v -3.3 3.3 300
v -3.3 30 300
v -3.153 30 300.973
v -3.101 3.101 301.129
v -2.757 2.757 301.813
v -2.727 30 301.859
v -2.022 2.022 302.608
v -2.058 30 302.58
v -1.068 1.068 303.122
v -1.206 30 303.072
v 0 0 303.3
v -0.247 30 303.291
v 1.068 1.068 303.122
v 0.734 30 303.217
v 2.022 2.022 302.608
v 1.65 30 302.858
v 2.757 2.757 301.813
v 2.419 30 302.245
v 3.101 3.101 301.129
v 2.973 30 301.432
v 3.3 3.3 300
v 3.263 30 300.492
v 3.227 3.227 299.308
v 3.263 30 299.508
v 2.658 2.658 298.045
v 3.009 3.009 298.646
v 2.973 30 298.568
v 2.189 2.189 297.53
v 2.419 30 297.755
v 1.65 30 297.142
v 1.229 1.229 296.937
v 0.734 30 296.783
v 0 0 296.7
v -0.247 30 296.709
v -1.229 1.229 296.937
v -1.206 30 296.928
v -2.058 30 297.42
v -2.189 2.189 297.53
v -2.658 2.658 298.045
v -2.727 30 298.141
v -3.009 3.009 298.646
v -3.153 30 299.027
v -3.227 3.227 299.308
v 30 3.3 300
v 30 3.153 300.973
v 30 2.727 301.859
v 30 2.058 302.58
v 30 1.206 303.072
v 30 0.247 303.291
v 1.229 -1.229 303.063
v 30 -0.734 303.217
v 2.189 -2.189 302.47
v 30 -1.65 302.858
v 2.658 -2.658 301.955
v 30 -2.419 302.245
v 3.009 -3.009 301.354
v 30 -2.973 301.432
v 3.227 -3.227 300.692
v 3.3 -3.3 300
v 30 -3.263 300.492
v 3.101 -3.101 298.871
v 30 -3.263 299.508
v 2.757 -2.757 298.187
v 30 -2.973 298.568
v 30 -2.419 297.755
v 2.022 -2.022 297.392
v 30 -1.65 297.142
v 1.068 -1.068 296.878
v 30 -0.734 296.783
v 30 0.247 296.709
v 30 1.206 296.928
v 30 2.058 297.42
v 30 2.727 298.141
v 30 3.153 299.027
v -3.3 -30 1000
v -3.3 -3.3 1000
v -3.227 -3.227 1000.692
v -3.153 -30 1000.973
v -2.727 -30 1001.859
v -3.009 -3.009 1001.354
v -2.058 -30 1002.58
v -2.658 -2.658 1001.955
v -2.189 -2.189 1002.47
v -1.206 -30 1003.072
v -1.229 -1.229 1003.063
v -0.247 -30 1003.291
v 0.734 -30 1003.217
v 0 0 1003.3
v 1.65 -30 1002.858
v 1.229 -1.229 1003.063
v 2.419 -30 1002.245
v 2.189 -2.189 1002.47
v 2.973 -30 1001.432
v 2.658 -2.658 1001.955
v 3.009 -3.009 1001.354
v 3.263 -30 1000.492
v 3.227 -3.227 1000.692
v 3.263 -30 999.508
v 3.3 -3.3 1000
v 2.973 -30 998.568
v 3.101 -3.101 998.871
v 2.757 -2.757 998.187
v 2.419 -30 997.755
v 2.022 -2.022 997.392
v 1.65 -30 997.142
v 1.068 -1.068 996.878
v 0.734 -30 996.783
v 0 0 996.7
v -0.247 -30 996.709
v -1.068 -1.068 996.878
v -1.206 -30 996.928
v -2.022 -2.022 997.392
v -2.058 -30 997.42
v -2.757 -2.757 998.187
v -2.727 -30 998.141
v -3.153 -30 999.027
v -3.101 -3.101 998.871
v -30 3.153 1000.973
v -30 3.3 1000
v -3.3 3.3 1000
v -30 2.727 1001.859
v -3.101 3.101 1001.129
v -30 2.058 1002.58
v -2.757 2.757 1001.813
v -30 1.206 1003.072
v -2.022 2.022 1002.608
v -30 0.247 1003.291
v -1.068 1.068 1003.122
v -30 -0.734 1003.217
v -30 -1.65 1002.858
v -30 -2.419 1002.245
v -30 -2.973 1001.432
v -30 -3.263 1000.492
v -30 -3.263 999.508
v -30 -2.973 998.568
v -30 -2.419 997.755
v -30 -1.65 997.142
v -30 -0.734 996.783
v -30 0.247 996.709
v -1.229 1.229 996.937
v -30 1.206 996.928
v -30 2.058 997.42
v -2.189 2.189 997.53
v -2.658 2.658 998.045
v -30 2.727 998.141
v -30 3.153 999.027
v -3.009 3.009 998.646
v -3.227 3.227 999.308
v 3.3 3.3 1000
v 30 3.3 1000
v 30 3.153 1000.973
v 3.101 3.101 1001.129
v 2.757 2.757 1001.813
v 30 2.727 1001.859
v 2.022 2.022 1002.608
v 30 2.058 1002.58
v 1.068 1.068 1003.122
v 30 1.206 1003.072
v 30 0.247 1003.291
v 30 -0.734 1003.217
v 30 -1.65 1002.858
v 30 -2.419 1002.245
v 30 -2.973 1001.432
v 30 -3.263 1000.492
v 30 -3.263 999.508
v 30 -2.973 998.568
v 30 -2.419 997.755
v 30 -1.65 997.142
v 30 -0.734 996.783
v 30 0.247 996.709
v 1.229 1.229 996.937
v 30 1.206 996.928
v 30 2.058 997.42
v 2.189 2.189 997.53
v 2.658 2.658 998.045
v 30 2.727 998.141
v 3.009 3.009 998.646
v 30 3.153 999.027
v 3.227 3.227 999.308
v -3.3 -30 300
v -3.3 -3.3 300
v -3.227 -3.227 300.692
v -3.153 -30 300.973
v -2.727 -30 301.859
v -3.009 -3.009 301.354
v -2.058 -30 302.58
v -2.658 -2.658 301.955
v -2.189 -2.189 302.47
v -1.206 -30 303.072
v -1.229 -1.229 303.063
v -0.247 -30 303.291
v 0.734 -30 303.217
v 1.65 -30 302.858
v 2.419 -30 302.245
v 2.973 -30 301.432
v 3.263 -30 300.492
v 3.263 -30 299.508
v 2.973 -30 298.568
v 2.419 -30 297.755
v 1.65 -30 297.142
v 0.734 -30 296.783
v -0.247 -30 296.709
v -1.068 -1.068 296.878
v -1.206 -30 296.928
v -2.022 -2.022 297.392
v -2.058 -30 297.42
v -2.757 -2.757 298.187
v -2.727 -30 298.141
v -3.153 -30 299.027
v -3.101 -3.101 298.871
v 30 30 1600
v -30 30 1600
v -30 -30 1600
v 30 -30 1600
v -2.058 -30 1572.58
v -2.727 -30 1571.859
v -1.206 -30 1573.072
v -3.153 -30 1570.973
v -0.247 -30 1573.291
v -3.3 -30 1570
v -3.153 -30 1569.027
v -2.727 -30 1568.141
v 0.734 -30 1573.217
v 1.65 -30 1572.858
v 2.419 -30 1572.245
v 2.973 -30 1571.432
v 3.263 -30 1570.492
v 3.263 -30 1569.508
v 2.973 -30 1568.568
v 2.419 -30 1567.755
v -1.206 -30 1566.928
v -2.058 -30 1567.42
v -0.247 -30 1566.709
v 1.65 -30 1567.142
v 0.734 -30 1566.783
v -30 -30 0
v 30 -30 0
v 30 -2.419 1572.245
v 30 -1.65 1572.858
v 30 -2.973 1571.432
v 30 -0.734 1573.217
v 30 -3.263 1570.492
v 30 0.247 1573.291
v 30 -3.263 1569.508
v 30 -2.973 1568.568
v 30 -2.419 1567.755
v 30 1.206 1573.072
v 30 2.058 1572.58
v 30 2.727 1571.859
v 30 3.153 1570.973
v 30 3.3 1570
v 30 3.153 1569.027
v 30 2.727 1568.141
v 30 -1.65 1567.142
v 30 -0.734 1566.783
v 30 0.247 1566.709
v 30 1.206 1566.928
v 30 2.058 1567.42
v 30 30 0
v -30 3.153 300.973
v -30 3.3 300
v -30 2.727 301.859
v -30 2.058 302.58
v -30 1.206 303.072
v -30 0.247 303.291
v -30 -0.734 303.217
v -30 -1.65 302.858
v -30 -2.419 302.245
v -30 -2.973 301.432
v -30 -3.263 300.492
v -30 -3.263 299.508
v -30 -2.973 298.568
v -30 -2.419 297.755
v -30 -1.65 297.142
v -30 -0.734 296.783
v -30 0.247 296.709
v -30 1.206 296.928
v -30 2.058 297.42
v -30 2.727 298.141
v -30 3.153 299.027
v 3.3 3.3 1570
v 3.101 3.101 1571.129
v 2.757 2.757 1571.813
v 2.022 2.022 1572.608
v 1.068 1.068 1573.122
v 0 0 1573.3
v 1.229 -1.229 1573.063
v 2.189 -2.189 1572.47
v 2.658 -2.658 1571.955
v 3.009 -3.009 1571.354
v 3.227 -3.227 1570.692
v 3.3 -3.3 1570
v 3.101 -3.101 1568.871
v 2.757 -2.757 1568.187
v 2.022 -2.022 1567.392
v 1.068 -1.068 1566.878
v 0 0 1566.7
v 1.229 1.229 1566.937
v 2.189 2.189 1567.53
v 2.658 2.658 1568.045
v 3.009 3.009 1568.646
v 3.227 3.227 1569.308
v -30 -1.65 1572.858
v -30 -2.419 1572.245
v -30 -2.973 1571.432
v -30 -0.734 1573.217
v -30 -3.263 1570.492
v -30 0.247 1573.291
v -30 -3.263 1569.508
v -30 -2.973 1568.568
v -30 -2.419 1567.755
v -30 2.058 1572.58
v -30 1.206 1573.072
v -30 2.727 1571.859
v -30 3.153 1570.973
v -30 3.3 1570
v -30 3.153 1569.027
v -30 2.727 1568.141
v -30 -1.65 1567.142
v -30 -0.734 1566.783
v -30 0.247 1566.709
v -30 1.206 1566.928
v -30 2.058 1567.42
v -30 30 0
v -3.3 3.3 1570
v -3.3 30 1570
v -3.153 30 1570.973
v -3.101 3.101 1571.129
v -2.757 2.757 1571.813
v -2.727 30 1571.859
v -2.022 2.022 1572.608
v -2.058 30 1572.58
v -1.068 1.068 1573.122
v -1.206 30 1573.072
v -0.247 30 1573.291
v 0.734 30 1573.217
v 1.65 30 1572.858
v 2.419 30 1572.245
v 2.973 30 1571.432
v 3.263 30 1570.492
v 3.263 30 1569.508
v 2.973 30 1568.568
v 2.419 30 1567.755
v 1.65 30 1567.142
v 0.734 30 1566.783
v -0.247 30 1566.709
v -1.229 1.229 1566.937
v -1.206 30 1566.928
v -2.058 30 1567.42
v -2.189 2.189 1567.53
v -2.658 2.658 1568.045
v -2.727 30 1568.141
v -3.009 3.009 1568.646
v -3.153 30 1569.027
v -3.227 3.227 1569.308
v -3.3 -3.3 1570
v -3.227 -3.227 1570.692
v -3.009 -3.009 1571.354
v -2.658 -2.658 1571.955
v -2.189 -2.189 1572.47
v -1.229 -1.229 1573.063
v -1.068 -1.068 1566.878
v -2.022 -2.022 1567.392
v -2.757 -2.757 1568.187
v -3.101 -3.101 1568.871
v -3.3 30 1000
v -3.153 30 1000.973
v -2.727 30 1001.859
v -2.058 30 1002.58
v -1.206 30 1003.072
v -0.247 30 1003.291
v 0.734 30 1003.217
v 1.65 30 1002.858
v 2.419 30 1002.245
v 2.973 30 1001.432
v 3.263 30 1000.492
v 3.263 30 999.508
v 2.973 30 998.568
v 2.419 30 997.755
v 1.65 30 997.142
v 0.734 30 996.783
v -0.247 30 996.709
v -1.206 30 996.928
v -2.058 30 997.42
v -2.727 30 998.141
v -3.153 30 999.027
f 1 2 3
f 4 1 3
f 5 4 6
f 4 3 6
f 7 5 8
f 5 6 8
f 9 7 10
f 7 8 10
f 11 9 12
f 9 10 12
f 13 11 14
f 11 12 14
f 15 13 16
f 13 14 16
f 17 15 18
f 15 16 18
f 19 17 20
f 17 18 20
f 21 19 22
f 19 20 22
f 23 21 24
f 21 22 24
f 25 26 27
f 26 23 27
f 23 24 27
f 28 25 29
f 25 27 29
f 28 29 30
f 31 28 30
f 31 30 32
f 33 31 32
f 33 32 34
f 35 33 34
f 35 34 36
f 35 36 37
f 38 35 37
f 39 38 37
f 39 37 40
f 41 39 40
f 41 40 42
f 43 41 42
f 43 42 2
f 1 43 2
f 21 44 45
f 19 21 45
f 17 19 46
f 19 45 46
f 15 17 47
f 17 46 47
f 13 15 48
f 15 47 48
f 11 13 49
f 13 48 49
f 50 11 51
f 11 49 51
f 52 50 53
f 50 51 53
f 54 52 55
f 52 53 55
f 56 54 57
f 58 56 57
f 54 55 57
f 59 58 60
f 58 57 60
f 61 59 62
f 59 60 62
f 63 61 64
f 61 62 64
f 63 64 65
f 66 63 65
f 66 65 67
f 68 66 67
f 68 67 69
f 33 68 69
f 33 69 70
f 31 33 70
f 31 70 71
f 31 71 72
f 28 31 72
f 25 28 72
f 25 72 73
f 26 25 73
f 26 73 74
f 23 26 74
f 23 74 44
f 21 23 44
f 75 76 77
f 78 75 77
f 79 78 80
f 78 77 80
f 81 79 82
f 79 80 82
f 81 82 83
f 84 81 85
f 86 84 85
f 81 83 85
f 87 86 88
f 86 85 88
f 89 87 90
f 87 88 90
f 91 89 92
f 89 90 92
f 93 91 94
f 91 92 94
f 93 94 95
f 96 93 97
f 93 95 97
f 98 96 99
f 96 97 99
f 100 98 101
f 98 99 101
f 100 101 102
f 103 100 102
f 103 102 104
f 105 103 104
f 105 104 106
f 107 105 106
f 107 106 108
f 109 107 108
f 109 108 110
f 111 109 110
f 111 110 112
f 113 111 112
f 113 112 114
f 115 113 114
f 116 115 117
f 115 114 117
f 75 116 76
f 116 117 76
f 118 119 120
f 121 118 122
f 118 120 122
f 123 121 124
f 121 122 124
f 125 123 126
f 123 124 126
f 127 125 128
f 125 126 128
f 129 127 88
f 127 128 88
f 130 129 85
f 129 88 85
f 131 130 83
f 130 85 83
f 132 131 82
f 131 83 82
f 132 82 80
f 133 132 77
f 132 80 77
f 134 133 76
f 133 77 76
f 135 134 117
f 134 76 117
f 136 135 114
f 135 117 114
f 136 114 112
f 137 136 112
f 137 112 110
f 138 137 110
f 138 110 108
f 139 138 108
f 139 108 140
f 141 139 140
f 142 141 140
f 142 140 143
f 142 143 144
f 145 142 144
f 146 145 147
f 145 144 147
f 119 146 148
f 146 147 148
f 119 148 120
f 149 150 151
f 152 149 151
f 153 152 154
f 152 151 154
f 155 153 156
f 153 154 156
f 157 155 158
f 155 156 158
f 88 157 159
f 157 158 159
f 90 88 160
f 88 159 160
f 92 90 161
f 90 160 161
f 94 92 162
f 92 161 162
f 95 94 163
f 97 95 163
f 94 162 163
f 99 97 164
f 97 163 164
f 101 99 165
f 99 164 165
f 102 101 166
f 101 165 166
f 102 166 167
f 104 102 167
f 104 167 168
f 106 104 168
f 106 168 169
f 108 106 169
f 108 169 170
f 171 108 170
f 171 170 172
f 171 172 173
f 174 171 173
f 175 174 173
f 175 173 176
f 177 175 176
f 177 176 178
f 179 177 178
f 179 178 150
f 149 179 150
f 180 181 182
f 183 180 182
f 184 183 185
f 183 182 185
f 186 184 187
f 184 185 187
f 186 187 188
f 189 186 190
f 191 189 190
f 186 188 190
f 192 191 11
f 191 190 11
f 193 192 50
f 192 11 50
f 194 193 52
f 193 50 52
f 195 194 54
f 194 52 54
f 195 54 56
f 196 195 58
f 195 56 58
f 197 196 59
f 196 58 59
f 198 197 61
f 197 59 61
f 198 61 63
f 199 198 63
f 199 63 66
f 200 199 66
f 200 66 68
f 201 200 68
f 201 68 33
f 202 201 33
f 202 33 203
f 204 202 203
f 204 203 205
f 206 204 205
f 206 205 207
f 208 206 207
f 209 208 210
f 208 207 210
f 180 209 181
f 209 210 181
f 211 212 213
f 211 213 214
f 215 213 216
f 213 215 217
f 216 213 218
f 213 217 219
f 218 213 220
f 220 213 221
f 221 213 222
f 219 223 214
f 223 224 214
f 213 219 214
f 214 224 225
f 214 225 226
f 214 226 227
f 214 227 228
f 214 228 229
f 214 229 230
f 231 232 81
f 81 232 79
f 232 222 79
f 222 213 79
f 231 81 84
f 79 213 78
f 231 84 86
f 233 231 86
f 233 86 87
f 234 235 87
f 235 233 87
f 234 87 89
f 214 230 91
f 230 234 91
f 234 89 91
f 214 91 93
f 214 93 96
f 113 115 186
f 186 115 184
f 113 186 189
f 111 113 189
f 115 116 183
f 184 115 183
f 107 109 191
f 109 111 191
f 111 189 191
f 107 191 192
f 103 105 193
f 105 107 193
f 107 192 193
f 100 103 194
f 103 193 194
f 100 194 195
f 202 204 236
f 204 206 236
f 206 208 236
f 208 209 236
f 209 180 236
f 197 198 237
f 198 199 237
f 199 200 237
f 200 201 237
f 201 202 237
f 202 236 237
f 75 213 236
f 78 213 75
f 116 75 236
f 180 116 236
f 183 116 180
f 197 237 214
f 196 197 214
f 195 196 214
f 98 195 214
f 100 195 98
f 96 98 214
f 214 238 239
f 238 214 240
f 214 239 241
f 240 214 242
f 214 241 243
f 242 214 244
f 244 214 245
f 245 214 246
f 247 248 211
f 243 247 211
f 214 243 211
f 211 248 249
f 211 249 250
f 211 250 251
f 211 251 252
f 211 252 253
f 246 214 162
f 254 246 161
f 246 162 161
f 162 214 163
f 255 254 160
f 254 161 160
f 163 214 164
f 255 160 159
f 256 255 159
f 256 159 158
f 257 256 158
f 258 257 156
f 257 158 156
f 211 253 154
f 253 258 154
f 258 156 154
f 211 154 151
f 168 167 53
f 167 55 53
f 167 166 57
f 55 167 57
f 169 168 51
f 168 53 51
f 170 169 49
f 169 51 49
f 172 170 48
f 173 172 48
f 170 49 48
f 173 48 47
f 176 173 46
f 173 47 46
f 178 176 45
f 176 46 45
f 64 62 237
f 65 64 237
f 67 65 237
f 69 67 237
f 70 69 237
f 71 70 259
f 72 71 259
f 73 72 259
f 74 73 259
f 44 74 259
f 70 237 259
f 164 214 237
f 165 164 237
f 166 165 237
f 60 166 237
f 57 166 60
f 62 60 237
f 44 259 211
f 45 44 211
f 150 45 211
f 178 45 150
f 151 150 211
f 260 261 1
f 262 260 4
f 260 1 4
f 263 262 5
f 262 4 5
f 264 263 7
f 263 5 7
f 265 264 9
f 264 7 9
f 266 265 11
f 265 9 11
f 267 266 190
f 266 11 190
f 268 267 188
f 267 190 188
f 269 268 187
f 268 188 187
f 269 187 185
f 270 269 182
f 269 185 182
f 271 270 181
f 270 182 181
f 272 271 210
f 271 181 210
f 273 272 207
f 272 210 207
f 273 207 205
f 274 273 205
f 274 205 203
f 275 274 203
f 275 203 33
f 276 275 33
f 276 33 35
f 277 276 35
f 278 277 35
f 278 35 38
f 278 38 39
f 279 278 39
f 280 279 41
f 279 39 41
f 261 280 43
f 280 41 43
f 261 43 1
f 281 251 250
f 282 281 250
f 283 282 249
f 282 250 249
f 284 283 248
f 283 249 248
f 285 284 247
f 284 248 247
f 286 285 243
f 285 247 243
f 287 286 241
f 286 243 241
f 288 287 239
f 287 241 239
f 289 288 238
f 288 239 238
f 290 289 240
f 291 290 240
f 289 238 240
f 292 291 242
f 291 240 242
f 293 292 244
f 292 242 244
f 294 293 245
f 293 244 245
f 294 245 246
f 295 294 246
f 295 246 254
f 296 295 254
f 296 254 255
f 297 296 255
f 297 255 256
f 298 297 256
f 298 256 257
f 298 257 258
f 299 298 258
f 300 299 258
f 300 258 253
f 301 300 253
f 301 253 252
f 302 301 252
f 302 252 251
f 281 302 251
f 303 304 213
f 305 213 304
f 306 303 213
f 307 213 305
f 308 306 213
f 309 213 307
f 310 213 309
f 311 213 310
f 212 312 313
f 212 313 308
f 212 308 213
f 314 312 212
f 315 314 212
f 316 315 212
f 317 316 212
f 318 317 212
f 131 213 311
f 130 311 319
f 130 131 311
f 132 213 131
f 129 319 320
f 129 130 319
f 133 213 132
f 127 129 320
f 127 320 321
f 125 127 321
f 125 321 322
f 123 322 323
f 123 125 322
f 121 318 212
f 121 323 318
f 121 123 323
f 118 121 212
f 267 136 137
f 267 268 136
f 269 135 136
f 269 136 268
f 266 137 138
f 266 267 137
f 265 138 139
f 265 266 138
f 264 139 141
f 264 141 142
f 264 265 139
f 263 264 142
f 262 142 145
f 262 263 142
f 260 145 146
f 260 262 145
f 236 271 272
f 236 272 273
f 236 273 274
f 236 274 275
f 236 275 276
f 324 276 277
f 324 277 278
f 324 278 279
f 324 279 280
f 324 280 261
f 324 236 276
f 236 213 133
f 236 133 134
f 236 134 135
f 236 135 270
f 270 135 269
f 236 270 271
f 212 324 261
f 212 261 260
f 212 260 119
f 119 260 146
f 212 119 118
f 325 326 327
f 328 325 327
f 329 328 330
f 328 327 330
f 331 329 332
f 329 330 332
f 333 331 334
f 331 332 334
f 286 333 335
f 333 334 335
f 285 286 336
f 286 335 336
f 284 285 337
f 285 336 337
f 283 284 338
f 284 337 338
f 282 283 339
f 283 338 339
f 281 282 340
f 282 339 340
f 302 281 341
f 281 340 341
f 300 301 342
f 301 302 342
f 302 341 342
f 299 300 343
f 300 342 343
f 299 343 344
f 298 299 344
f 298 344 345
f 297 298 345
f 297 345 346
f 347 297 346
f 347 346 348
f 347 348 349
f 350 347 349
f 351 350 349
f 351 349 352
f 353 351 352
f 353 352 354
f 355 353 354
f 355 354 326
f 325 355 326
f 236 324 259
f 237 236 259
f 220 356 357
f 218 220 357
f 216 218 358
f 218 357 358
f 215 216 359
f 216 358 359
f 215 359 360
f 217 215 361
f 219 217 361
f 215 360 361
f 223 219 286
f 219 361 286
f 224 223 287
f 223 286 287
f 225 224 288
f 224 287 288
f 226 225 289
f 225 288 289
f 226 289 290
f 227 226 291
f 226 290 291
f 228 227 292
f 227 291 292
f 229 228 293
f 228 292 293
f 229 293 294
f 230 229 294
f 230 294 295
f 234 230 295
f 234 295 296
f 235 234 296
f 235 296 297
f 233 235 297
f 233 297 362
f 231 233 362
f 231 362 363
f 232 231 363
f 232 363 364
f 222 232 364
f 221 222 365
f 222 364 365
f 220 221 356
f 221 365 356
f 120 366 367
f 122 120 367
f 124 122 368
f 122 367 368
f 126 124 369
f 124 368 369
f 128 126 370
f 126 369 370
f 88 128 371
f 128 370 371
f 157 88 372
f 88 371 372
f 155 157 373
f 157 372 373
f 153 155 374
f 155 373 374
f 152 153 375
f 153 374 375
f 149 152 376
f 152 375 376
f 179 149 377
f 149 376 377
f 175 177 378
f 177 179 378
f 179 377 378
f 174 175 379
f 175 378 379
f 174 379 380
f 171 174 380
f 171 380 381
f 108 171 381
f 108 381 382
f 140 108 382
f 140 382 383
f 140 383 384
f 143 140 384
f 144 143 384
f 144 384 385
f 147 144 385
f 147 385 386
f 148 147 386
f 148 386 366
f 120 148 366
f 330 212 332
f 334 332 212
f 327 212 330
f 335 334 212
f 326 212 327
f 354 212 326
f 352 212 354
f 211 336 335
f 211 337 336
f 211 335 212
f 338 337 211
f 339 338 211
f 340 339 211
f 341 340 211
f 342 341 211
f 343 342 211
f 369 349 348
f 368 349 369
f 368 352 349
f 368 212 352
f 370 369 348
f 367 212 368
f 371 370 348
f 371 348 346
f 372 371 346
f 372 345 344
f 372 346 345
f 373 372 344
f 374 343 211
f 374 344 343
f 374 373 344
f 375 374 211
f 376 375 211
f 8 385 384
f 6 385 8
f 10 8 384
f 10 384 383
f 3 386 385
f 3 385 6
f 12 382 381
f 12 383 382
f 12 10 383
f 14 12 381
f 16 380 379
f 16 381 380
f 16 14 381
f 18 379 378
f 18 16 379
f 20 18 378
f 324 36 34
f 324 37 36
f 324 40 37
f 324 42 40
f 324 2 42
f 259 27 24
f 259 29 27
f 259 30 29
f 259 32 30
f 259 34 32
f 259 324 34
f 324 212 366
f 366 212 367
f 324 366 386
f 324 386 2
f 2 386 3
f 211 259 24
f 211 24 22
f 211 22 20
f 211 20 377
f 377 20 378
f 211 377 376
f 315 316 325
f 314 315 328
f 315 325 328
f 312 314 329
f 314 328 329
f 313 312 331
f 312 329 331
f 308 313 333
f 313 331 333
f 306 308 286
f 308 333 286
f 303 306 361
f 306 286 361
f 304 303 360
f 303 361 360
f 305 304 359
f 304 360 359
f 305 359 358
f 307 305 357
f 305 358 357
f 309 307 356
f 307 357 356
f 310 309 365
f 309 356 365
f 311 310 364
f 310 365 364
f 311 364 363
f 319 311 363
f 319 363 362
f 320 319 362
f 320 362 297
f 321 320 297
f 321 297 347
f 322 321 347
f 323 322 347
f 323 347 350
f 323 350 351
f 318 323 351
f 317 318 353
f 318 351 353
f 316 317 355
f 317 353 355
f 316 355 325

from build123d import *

# Parameters (mm, degrees)
F0_W     = 60
F0_H     = 60
F1_DEPTH = 1600
F3_D     = 6.6
F5_D     = 6.6


with BuildPart() as f1:
    # F0 (on Top) → F1 (new body)
    with BuildSketch(Plane.XY):
        Rectangle(F0_W, F0_H)
    extrude(amount=F1_DEPTH)

    # F3 (through all)
    with Locations(Plane(origin=(-30, 0, 0), x_dir=(0, -1, 0), z_dir=(-1, 0, 0))):
        with Locations((0, 1570), (0, 300), (0, 1000)):
            Hole(F3_D / 2)

    # F5 (through all)
    with Locations(Plane.XZ.offset(30)):
        with Locations((0, 1570), (0, 300), (0, 1000)):
            Hole(F5_D / 2)


solid = f1.part
